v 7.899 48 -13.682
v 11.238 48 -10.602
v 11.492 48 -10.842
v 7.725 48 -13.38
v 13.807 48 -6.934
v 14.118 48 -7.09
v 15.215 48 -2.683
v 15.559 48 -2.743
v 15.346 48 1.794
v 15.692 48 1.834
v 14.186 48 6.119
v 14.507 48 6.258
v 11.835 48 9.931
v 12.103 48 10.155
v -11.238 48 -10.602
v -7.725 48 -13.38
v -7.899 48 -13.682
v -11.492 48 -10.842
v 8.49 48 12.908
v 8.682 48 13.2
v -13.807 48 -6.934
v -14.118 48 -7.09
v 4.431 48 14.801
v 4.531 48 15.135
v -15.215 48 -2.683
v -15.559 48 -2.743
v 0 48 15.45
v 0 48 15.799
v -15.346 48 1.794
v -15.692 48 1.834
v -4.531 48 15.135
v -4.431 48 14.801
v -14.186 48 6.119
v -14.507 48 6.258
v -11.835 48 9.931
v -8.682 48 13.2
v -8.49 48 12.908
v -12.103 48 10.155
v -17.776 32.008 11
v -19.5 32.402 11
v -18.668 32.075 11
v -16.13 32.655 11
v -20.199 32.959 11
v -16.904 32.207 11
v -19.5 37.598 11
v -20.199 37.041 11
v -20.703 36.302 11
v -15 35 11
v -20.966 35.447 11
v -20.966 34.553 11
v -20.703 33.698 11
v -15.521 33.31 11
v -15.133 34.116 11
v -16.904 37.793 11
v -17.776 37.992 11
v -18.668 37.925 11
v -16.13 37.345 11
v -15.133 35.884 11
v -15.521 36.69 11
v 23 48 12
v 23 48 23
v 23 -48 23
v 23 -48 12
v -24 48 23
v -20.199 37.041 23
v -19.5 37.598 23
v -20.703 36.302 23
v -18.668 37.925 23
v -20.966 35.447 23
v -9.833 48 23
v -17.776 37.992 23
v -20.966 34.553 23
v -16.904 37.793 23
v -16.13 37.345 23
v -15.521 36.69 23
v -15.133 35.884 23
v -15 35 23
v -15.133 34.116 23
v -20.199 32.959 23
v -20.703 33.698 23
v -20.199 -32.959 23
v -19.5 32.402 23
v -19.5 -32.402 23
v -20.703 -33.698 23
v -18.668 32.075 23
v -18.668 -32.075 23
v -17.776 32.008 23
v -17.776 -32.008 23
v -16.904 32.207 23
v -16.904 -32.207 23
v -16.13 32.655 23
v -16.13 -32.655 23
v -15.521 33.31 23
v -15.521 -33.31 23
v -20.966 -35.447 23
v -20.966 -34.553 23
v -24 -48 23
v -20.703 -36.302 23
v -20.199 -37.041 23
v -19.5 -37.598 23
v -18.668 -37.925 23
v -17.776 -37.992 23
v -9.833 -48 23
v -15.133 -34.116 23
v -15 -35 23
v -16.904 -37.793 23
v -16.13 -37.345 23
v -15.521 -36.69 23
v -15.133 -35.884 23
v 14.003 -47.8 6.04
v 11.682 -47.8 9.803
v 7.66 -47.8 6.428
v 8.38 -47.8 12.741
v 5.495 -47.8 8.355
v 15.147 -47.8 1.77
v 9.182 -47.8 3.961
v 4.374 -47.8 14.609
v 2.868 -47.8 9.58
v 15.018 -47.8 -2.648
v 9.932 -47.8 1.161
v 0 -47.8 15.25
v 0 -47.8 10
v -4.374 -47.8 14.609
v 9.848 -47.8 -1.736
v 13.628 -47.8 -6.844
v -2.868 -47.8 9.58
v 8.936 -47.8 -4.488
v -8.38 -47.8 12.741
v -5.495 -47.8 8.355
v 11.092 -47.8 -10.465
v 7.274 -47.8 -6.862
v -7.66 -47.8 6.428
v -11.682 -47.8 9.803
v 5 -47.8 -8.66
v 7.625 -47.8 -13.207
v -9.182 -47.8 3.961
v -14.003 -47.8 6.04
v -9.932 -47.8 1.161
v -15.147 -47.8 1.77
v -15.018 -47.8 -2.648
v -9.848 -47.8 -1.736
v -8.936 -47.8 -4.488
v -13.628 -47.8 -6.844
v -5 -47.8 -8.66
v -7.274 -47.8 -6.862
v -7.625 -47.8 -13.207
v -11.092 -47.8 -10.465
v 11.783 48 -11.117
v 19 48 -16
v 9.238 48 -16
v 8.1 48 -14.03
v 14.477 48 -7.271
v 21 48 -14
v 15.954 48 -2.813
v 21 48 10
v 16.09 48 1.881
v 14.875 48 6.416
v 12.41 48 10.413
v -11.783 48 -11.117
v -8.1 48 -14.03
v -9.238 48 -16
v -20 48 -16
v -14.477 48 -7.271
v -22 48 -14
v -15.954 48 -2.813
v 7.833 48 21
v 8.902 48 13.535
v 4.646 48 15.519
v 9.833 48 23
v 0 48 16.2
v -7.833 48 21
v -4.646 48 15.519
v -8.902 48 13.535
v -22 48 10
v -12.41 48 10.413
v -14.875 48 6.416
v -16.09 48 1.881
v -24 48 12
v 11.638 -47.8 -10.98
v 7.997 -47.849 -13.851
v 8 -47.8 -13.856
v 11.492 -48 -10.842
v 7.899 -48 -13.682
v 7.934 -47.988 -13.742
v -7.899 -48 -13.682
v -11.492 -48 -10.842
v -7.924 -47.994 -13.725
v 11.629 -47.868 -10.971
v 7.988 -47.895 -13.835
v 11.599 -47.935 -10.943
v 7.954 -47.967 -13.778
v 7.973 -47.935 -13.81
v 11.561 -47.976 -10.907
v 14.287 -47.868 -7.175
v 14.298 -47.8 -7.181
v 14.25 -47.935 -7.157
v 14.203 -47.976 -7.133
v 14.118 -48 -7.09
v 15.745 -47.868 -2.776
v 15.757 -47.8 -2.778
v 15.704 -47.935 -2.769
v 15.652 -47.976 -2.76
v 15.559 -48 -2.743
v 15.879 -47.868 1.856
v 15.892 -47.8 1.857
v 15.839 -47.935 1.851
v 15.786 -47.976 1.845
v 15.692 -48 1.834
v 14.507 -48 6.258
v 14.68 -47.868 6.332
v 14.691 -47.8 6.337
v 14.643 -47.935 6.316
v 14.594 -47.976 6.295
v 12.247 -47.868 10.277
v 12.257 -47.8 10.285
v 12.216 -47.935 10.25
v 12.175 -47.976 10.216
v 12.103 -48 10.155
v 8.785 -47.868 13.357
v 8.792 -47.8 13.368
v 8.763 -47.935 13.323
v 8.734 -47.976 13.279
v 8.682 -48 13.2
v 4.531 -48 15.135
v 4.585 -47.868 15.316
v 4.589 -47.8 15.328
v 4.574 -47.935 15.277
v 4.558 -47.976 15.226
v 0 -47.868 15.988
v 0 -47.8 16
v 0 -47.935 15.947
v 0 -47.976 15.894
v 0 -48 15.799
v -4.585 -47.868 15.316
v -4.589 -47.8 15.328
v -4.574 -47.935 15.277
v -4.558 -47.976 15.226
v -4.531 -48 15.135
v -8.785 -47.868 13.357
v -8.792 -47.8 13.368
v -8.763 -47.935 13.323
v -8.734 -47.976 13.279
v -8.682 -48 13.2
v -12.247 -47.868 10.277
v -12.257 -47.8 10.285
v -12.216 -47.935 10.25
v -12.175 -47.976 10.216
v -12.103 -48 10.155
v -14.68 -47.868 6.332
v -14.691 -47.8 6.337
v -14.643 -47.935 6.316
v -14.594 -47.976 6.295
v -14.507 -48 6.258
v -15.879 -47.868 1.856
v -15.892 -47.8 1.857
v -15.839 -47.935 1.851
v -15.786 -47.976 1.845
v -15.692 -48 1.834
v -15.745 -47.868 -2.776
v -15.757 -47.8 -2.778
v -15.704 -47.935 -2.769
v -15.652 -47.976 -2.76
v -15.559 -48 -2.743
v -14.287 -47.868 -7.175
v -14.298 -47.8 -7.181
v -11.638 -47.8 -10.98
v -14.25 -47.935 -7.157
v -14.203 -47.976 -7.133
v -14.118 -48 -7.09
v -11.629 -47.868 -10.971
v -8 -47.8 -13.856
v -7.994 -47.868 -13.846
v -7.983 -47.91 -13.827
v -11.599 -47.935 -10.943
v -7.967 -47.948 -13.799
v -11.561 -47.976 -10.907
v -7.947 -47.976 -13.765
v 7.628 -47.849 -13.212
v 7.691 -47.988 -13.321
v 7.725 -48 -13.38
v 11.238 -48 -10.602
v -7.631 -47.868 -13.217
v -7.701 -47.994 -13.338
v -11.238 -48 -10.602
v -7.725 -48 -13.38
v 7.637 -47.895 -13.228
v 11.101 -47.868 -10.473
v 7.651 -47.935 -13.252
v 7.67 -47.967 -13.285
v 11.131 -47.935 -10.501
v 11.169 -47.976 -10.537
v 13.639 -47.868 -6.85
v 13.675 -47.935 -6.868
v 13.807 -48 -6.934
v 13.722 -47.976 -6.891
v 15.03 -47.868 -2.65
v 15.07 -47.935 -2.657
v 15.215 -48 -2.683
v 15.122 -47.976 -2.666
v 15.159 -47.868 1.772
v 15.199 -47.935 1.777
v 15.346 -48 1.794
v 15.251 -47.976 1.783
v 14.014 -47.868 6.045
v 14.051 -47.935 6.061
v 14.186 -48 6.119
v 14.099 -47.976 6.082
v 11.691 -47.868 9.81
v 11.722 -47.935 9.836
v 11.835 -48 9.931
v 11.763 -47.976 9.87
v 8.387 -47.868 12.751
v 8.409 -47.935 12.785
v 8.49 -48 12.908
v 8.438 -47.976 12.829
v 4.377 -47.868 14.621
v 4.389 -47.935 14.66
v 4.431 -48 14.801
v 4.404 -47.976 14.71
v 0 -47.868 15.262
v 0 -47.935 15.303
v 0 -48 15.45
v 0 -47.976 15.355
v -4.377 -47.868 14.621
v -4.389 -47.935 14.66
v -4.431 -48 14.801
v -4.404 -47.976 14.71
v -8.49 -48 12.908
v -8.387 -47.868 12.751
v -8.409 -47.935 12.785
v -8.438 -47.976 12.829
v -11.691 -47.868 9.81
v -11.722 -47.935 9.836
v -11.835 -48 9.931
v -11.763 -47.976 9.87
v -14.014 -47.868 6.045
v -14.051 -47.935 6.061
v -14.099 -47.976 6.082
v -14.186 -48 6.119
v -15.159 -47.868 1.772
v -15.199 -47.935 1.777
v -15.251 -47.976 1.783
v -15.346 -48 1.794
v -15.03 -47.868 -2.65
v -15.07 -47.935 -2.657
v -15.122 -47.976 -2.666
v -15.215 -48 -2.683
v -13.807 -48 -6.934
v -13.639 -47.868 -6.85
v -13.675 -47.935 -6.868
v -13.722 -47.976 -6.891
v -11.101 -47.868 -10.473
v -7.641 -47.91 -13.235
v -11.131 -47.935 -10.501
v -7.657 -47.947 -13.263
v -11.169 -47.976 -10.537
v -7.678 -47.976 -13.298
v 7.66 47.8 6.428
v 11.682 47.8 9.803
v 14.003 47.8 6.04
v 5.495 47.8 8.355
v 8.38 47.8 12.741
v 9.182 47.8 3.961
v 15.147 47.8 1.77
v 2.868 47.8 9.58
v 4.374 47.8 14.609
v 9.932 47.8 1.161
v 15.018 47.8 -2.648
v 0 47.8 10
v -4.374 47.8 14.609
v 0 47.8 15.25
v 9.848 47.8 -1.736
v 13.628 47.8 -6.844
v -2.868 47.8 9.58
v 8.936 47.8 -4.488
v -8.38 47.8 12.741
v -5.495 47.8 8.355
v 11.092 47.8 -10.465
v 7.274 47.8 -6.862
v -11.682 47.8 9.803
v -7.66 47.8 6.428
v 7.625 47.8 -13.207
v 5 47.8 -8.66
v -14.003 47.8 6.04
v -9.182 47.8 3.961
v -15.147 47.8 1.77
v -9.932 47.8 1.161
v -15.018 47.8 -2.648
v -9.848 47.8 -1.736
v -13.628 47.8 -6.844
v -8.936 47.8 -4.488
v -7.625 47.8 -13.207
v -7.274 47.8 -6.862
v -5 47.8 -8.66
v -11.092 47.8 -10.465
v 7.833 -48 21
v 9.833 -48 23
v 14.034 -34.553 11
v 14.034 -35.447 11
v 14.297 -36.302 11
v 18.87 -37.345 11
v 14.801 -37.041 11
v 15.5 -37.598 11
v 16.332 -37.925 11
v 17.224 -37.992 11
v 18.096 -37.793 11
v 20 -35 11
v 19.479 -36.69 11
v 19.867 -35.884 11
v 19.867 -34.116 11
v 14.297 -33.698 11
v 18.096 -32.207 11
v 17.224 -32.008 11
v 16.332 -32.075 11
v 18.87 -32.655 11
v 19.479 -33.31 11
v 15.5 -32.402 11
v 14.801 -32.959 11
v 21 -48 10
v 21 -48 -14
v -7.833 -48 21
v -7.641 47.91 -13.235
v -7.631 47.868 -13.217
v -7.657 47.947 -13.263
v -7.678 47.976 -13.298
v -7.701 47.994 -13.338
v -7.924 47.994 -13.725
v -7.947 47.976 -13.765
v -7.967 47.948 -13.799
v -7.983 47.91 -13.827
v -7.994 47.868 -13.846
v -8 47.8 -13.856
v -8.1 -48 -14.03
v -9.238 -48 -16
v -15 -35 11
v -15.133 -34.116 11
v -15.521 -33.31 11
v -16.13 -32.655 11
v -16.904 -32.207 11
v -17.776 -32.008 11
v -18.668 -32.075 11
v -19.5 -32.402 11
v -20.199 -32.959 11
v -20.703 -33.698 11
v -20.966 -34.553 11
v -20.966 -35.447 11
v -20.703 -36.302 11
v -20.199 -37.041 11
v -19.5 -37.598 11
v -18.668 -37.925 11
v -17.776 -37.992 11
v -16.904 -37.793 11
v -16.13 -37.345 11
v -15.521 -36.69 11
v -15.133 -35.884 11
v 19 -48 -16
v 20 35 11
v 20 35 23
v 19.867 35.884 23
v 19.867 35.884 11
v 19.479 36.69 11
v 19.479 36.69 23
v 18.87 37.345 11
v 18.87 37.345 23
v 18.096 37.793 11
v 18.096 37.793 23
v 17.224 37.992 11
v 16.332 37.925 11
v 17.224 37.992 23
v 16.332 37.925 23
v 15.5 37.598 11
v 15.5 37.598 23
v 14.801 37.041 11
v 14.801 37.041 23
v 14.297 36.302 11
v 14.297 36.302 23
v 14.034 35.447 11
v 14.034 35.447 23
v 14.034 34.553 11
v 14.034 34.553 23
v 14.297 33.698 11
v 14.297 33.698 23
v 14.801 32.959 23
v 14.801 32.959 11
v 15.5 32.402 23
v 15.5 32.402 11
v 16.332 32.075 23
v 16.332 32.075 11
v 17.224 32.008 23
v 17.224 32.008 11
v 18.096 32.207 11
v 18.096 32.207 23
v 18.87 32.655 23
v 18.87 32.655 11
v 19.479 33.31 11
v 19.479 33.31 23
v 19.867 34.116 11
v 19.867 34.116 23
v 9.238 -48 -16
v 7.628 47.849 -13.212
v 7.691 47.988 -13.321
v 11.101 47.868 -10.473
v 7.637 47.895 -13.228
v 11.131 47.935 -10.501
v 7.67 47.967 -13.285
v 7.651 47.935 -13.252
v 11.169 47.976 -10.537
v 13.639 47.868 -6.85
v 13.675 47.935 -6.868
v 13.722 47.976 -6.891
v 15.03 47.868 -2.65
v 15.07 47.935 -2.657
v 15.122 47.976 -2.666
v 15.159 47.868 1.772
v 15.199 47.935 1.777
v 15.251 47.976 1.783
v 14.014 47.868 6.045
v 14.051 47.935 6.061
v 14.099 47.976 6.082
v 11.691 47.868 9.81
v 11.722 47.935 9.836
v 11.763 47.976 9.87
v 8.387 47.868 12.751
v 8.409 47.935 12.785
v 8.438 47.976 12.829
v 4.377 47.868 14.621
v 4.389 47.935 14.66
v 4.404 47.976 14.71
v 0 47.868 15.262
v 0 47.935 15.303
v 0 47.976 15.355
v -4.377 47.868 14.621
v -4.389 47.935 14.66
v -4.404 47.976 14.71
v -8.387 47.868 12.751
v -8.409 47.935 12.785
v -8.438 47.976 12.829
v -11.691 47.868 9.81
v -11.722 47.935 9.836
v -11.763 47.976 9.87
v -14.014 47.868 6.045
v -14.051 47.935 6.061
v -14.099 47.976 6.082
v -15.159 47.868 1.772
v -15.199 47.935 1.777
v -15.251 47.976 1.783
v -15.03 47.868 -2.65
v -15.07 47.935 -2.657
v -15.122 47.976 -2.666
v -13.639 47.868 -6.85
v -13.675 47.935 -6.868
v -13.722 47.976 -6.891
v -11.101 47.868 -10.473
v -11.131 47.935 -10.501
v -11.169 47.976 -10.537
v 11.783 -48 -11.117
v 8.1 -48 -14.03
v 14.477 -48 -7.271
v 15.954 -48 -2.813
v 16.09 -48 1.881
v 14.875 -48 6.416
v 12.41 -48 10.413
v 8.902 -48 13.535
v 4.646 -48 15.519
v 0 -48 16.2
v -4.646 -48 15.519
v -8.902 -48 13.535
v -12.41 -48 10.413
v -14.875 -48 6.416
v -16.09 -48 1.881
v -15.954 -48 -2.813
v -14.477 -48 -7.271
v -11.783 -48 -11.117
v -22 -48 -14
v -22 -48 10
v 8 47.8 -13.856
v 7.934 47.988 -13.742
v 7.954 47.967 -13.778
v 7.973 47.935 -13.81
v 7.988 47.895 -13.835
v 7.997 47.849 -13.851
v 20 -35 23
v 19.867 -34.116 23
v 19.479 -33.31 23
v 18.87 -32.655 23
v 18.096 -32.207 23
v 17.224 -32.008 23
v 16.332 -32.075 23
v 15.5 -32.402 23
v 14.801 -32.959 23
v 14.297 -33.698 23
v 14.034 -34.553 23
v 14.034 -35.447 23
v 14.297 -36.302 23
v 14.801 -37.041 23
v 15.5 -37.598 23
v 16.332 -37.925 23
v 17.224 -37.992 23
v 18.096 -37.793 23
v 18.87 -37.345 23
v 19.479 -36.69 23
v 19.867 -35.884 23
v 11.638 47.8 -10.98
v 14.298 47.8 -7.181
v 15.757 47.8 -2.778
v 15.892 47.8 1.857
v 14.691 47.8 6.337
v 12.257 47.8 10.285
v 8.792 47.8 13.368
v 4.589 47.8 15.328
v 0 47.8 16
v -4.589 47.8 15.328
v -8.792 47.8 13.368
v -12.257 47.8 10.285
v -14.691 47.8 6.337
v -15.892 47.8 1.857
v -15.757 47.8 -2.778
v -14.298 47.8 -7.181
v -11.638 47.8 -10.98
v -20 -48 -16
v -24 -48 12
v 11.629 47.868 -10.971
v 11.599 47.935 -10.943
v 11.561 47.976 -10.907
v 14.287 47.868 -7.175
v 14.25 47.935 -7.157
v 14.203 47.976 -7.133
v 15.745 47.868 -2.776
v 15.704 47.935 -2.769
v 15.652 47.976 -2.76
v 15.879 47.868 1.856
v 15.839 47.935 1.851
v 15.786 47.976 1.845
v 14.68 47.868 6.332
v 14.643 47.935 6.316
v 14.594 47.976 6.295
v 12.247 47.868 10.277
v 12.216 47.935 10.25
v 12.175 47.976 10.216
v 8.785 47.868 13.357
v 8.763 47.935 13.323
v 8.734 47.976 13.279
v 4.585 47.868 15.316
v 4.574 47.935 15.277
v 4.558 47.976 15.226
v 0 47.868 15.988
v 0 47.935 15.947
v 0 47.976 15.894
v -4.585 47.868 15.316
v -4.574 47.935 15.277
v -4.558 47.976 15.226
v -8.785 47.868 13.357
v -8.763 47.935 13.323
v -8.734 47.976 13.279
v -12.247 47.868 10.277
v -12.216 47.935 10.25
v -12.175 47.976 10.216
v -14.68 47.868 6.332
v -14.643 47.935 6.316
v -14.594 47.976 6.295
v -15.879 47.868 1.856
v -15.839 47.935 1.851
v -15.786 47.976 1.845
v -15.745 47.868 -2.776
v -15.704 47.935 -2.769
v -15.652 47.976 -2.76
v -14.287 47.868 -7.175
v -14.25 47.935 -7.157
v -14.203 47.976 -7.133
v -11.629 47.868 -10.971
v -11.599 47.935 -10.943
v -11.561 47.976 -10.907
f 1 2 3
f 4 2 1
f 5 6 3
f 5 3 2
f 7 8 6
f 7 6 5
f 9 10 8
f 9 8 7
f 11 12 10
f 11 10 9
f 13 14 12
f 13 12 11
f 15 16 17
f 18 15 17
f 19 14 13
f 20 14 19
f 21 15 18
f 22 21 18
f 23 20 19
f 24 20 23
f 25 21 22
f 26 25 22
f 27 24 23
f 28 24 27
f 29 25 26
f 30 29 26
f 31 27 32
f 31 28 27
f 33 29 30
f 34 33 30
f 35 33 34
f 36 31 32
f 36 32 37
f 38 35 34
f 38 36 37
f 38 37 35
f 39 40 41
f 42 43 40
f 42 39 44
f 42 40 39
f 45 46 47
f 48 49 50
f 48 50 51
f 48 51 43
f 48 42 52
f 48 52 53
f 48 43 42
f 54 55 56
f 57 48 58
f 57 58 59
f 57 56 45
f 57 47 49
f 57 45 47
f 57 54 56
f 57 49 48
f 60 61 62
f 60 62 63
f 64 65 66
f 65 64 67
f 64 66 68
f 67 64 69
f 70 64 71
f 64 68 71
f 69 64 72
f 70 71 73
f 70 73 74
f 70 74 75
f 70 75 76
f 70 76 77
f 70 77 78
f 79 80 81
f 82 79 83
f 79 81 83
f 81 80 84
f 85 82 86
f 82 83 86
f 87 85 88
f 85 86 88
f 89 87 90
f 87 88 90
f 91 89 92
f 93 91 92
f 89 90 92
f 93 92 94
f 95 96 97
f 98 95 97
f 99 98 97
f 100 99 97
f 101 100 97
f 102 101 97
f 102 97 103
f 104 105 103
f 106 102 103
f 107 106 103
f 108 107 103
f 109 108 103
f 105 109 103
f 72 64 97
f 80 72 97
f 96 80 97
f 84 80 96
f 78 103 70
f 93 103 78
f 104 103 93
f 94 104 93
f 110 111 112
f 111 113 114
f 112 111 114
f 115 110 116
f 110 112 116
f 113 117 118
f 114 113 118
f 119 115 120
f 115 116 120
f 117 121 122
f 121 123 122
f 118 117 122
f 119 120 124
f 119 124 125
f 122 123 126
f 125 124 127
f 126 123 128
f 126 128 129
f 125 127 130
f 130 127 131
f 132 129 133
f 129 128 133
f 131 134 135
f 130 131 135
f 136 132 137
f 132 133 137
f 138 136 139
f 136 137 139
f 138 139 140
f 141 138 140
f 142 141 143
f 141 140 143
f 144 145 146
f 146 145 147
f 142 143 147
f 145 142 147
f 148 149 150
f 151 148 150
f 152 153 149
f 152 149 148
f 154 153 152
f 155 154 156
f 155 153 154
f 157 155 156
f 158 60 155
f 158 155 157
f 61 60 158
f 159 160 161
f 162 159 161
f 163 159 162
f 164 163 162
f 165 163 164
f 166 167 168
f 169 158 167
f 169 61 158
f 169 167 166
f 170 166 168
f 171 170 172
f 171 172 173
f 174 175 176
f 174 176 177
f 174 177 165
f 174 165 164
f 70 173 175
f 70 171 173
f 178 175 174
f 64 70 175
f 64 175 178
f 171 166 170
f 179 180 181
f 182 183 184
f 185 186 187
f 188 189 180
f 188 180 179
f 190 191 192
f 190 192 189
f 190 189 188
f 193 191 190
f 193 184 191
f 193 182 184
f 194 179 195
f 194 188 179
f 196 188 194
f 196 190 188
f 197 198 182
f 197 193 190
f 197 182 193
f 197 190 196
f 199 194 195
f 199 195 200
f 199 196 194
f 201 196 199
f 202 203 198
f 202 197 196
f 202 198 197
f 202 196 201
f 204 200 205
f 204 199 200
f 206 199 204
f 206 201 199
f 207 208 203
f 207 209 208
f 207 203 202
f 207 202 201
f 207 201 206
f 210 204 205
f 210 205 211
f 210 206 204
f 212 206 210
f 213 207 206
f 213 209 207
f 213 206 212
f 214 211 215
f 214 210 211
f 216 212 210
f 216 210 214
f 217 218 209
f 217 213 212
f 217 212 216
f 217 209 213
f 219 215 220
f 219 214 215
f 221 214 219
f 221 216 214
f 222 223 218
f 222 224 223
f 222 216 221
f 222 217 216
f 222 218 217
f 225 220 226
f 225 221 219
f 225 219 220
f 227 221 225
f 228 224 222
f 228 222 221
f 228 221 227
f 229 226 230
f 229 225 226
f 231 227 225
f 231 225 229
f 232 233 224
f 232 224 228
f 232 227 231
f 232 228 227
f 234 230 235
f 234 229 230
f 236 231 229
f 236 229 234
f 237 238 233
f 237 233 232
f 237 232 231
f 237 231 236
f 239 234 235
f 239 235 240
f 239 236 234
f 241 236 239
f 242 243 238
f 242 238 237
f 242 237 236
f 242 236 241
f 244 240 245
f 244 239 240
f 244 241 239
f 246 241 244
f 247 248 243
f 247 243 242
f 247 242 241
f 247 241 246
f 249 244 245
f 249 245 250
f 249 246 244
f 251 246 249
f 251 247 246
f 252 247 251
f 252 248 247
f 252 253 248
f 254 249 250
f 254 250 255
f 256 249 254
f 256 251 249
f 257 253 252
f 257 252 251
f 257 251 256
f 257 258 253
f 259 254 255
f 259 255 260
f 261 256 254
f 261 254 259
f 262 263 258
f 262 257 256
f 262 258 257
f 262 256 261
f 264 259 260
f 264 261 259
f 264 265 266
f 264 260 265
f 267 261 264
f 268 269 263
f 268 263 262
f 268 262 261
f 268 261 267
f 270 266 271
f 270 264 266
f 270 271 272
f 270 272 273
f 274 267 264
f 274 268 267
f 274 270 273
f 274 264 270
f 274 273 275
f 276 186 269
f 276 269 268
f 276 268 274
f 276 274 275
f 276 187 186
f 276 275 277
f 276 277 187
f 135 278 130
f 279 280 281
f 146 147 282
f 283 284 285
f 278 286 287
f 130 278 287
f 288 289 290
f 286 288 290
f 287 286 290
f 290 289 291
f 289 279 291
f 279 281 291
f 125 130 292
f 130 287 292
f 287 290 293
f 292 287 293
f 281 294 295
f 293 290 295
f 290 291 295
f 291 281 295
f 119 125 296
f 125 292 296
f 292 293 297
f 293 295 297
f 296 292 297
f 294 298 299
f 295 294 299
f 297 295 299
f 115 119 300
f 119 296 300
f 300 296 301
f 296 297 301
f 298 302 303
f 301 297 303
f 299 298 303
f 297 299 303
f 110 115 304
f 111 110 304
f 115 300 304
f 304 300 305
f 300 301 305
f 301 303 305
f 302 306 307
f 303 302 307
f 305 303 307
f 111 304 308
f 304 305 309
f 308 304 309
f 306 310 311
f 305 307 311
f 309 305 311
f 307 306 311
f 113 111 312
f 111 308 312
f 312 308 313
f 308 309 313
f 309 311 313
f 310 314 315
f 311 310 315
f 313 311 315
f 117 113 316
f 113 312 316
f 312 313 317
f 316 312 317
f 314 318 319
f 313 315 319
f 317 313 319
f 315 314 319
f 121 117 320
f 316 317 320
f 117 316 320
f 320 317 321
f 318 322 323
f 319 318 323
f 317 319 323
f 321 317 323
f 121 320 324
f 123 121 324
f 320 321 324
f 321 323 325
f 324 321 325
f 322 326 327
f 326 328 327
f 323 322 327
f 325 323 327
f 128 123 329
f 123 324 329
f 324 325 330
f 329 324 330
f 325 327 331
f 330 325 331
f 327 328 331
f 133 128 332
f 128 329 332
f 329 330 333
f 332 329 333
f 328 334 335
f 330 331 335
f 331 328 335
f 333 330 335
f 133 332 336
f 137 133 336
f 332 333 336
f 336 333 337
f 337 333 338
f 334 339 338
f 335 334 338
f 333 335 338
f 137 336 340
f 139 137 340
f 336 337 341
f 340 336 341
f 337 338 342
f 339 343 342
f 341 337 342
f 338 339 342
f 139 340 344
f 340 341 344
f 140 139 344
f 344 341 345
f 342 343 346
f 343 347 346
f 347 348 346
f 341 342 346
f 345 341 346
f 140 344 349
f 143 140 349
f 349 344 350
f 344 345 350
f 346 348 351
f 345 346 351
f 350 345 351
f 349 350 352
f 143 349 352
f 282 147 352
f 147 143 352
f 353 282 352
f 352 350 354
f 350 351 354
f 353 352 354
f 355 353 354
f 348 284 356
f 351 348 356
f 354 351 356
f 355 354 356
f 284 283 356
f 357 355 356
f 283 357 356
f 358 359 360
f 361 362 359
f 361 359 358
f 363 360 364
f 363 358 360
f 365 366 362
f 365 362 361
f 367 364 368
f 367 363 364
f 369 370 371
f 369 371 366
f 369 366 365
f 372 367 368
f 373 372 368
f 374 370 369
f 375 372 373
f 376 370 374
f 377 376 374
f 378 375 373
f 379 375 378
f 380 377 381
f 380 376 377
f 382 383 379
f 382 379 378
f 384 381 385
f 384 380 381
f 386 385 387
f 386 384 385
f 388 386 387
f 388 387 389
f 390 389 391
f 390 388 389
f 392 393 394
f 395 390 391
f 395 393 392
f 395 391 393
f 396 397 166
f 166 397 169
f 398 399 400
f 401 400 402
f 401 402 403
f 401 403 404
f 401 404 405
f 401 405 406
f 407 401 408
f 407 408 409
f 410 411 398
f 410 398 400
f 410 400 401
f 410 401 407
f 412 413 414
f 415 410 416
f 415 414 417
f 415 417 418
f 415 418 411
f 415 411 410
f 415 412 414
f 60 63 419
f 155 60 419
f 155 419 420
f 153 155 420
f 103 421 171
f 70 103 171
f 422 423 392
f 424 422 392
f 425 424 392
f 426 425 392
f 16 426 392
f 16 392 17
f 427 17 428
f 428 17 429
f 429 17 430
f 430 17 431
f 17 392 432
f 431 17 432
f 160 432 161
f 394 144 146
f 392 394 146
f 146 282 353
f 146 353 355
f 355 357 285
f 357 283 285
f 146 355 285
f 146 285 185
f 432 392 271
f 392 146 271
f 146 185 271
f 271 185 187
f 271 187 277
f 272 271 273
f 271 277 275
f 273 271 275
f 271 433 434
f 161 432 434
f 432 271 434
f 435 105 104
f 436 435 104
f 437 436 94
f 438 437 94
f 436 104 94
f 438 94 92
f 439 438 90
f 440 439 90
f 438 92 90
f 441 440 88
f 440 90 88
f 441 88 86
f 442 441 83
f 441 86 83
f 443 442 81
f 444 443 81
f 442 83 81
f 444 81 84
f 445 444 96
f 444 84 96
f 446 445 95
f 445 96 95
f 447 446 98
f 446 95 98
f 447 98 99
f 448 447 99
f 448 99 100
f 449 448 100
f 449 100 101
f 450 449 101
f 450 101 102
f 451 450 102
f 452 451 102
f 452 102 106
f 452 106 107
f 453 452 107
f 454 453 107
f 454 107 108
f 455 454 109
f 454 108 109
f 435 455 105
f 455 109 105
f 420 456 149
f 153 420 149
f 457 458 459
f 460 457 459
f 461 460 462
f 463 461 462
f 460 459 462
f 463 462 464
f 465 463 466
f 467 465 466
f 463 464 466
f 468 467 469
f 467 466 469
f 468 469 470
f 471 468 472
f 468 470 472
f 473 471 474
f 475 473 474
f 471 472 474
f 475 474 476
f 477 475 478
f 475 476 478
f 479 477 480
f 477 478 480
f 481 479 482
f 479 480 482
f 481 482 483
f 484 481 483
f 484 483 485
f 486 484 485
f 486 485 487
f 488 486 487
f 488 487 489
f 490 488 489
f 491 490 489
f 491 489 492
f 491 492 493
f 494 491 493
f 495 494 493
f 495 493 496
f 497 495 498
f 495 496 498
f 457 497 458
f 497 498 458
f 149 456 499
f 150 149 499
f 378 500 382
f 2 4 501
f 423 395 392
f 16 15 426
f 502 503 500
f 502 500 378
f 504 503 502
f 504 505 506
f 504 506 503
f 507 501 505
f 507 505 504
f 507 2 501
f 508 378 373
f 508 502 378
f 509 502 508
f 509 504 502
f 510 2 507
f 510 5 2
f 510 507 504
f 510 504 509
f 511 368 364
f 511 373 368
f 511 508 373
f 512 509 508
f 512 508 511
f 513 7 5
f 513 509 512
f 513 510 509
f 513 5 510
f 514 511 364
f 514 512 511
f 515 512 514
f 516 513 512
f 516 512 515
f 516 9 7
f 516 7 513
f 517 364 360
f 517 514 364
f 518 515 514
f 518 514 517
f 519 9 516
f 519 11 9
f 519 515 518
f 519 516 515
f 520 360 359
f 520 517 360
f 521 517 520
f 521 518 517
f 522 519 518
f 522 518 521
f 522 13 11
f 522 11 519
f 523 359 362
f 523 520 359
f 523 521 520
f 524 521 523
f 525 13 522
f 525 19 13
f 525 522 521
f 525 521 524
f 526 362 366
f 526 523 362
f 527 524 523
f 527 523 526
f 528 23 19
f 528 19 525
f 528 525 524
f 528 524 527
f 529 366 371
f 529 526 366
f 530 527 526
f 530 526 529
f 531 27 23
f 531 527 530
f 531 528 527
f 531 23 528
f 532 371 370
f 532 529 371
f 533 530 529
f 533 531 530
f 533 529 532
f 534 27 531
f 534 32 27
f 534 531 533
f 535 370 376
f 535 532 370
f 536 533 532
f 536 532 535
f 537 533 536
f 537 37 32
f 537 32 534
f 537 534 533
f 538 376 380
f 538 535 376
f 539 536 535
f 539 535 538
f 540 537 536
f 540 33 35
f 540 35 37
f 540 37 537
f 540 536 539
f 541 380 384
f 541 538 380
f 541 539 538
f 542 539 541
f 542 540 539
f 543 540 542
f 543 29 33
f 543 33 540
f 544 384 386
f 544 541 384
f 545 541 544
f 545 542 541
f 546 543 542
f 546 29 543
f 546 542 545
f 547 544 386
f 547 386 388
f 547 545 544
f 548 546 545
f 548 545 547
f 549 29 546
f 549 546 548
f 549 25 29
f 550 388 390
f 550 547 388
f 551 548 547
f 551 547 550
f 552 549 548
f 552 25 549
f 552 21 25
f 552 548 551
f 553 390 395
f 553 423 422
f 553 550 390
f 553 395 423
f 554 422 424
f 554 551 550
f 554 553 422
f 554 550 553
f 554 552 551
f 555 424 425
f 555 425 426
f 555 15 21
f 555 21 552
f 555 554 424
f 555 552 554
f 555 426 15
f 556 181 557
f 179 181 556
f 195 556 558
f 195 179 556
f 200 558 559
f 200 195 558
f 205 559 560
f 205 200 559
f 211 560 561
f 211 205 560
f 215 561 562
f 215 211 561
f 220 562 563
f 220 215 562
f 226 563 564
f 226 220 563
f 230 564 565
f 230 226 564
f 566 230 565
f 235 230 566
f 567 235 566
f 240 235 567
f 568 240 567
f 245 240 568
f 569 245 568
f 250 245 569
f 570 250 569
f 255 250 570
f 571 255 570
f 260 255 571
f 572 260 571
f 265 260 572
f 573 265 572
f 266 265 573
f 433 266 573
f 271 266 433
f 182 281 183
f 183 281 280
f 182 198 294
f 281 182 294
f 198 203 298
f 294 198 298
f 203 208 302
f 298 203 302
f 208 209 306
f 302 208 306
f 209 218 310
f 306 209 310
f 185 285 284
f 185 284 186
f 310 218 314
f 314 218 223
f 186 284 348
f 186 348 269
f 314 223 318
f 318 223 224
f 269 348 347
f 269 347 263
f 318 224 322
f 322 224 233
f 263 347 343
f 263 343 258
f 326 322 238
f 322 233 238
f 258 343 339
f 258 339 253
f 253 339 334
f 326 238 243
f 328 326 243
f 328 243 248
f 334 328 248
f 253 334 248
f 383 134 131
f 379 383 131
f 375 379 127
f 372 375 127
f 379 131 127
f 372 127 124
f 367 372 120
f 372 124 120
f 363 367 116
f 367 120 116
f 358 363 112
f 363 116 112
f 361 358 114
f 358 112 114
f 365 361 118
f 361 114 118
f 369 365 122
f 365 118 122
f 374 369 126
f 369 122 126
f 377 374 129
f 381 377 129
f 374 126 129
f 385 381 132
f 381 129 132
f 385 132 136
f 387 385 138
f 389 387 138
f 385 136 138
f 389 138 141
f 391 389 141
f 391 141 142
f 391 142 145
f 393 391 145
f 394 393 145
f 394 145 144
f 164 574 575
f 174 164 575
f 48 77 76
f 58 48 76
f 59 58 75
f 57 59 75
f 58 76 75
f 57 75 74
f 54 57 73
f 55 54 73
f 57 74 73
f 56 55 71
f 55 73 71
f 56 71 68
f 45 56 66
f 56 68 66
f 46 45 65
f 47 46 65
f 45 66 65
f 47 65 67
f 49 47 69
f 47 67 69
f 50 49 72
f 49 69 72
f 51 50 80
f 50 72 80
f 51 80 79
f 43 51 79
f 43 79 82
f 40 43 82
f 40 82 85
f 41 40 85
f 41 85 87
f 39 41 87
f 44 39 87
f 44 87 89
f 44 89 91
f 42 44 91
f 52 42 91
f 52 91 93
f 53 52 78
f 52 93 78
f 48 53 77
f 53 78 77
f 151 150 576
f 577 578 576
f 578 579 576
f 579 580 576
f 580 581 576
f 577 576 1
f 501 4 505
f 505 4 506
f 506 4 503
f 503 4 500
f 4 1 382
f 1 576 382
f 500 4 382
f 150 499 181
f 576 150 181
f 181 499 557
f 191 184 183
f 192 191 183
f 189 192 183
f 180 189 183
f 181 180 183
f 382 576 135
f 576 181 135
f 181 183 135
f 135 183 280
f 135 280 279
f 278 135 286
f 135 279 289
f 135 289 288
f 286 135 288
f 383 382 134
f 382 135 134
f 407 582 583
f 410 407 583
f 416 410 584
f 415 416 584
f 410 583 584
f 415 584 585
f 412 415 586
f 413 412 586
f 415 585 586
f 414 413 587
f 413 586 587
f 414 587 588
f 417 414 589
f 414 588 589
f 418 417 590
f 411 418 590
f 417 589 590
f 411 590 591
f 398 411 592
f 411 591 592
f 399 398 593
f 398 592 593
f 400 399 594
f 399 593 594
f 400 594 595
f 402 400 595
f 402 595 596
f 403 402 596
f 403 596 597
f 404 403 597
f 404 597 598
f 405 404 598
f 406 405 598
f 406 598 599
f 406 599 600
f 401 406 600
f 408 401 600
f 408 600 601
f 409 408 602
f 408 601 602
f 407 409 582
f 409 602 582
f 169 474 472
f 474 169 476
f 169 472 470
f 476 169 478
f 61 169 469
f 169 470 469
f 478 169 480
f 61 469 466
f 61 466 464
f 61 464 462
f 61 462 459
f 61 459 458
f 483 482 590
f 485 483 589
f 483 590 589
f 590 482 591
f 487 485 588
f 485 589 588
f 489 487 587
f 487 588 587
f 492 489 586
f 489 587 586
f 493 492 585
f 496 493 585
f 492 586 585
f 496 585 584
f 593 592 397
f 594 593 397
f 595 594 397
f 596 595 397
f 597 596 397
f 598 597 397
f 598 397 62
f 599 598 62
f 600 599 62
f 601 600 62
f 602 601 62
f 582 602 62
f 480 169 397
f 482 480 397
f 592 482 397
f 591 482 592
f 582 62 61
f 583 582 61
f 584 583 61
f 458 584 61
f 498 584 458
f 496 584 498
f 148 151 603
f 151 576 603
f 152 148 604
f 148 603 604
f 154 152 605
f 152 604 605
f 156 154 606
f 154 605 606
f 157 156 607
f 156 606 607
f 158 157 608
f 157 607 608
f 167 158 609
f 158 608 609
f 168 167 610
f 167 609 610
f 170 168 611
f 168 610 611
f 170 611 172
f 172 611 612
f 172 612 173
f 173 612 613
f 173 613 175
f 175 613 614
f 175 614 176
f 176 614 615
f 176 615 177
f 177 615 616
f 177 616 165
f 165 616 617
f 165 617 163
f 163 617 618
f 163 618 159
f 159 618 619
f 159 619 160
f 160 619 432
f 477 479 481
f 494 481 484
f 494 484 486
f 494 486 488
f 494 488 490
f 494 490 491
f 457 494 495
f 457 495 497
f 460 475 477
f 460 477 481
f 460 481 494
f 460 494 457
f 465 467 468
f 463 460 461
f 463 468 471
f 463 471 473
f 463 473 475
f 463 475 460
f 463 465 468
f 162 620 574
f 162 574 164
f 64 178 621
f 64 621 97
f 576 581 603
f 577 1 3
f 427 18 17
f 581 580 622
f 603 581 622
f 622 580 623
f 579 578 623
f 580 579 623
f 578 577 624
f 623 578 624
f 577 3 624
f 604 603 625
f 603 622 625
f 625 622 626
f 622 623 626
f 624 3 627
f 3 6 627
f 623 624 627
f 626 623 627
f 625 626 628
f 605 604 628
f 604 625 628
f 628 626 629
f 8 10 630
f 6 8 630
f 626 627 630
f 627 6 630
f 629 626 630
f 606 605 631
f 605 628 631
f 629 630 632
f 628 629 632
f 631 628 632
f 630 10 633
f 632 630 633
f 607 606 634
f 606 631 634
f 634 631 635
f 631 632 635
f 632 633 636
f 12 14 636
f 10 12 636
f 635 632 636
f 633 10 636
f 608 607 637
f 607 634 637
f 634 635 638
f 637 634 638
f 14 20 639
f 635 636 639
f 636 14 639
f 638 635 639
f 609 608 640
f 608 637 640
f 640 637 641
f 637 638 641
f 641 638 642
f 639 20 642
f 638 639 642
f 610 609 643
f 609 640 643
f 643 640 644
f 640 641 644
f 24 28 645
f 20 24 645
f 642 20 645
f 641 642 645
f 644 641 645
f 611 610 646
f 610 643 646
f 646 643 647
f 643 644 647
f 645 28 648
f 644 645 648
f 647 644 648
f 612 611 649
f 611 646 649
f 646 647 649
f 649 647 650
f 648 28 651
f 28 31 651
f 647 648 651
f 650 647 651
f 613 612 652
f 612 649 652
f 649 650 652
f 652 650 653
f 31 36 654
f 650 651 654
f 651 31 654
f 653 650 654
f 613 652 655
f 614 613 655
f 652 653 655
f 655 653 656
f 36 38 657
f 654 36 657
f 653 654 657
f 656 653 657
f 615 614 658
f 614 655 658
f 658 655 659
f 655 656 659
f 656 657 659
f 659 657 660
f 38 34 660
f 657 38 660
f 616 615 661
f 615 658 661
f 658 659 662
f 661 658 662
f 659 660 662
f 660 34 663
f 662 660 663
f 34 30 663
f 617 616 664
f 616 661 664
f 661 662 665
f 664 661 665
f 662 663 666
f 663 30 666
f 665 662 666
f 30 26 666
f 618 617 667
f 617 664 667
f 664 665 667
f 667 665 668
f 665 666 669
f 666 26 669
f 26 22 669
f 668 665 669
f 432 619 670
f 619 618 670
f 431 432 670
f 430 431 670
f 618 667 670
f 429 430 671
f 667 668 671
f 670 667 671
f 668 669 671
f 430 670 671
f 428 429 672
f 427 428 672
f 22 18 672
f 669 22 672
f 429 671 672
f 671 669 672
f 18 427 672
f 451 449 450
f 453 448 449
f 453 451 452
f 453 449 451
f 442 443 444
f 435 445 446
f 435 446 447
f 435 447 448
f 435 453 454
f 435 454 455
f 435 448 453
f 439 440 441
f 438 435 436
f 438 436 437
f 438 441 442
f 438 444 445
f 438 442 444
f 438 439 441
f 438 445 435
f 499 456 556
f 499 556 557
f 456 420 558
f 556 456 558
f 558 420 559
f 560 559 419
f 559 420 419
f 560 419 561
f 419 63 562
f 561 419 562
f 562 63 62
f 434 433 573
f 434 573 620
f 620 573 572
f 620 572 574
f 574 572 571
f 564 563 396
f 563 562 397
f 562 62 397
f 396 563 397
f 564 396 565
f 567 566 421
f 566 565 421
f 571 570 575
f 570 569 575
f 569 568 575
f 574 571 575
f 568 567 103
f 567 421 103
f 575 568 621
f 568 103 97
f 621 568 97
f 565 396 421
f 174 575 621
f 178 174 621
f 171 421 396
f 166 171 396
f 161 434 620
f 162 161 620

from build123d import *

# Parameters (mm, degrees)
EXTRUDE_2_DEPTH     = 96
CHAMFER_1_SIZE      = 2
SKETCH_5_R          = 3
CUT_EXTRUDE_1_DEPTH = 12
CHAMFER_2_SIZE      = 2


with BuildPart() as part:
    # 草图4 → 拉伸2 (new body)
    with BuildSketch(Plane(origin=(0, -48, 0), x_dir=(-1, 0, 0), z_dir=(0, 1, 0))):
        with BuildLine():
            Line((7.833333333, 21), (-7.833333333, 21))
            Line((-7.833333333, 21), (-7.833333333, 23))
            Line((-7.833333333, 23), (-23, 23))
            Line((-23, 23), (-23, 12))
            Line((-23, 12), (-21, 10))
            Line((-21, 10), (-21, -16))
            Line((-21, -16), (-9.237604307, -16))
            Line((-9.237604307, -16), (-5, -8.660254038))
            ThreePointArc((-5, -8.660254038), (0, 10), (5, -8.660254038))
            Line((5, -8.660254038), (9.237604307, -16))
            Line((9.237604307, -16), (22, -16))
            Line((22, -16), (22, 10))
            Line((22, 10), (24, 12))
            Line((24, 12), (24, 23))
            Line((24, 23), (7.833333333, 23))
            Line((7.833333333, 23), (7.833333333, 21))
        make_face()
    extrude(amount=EXTRUDE_2_DEPTH)

    # 倒角1
    chamfer_1_edges = [part.edges().sort_by_distance(p)[0] for p in [
        (-7.833333333, 0, 23),
        (7.833333333, 0, 23),
    ]]
    chamfer(chamfer_1_edges, length=CHAMFER_1_SIZE - 0.0001)  # a hair under: the kernel refuses the full size

    # 草图5 → 切除-拉伸1 (cut)
    with BuildSketch(Plane.XY.offset(23)):
        with Locations((-18, 35)):
            Circle(SKETCH_5_R)
        with Locations((17, 35)):
            Circle(SKETCH_5_R)
        with Locations((17, -35)):
            Circle(SKETCH_5_R)
        with Locations((-18, -35)):
            Circle(SKETCH_5_R)
    extrude(amount=-CUT_EXTRUDE_1_DEPTH, mode=Mode.SUBTRACT)

    # 倒角2
    chamfer_2_edges = [part.edges().sort_by_distance(p)[0] for p in [
        (-22, 0, -16),
        (21, 0, -16),
    ]]
    chamfer(chamfer_2_edges, length=CHAMFER_2_SIZE)

    # 草图6 → 切除-旋转1 (revolve, cut)
    with BuildSketch(Plane(origin=(0, 0, 0), x_dir=(0, 0, -1), z_dir=(1, 0, 0))):
        with BuildLine():
            Line((-16.2, -48), (-16, -47.8))
            ThreePointArc((-16, -47.8), (-15.940621125, -47.941496067), (-15.798761062, -48))
            Line((-15.798761062, -48), (-16.2, -48))
        make_face()
        with BuildLine():
            Line((-15.45, -48), (0, -48))
            Line((0, -48), (0, -47.8))
            Line((0, -47.8), (-15.25, -47.8))
            ThreePointArc((-15.25, -47.8), (-15.308578644, -47.941421356), (-15.45, -48))
        make_face()
    cut_revolve_1 = revolve(axis=Axis((0, -10.264906919, 0), (0, -1, 0)), mode=Mode.SUBTRACT)

    # 镜向1: 切除-旋转1 across plane
    add(cut_revolve_1.mirror(Plane.ZX), mode=Mode.SUBTRACT)


solid = part.part
